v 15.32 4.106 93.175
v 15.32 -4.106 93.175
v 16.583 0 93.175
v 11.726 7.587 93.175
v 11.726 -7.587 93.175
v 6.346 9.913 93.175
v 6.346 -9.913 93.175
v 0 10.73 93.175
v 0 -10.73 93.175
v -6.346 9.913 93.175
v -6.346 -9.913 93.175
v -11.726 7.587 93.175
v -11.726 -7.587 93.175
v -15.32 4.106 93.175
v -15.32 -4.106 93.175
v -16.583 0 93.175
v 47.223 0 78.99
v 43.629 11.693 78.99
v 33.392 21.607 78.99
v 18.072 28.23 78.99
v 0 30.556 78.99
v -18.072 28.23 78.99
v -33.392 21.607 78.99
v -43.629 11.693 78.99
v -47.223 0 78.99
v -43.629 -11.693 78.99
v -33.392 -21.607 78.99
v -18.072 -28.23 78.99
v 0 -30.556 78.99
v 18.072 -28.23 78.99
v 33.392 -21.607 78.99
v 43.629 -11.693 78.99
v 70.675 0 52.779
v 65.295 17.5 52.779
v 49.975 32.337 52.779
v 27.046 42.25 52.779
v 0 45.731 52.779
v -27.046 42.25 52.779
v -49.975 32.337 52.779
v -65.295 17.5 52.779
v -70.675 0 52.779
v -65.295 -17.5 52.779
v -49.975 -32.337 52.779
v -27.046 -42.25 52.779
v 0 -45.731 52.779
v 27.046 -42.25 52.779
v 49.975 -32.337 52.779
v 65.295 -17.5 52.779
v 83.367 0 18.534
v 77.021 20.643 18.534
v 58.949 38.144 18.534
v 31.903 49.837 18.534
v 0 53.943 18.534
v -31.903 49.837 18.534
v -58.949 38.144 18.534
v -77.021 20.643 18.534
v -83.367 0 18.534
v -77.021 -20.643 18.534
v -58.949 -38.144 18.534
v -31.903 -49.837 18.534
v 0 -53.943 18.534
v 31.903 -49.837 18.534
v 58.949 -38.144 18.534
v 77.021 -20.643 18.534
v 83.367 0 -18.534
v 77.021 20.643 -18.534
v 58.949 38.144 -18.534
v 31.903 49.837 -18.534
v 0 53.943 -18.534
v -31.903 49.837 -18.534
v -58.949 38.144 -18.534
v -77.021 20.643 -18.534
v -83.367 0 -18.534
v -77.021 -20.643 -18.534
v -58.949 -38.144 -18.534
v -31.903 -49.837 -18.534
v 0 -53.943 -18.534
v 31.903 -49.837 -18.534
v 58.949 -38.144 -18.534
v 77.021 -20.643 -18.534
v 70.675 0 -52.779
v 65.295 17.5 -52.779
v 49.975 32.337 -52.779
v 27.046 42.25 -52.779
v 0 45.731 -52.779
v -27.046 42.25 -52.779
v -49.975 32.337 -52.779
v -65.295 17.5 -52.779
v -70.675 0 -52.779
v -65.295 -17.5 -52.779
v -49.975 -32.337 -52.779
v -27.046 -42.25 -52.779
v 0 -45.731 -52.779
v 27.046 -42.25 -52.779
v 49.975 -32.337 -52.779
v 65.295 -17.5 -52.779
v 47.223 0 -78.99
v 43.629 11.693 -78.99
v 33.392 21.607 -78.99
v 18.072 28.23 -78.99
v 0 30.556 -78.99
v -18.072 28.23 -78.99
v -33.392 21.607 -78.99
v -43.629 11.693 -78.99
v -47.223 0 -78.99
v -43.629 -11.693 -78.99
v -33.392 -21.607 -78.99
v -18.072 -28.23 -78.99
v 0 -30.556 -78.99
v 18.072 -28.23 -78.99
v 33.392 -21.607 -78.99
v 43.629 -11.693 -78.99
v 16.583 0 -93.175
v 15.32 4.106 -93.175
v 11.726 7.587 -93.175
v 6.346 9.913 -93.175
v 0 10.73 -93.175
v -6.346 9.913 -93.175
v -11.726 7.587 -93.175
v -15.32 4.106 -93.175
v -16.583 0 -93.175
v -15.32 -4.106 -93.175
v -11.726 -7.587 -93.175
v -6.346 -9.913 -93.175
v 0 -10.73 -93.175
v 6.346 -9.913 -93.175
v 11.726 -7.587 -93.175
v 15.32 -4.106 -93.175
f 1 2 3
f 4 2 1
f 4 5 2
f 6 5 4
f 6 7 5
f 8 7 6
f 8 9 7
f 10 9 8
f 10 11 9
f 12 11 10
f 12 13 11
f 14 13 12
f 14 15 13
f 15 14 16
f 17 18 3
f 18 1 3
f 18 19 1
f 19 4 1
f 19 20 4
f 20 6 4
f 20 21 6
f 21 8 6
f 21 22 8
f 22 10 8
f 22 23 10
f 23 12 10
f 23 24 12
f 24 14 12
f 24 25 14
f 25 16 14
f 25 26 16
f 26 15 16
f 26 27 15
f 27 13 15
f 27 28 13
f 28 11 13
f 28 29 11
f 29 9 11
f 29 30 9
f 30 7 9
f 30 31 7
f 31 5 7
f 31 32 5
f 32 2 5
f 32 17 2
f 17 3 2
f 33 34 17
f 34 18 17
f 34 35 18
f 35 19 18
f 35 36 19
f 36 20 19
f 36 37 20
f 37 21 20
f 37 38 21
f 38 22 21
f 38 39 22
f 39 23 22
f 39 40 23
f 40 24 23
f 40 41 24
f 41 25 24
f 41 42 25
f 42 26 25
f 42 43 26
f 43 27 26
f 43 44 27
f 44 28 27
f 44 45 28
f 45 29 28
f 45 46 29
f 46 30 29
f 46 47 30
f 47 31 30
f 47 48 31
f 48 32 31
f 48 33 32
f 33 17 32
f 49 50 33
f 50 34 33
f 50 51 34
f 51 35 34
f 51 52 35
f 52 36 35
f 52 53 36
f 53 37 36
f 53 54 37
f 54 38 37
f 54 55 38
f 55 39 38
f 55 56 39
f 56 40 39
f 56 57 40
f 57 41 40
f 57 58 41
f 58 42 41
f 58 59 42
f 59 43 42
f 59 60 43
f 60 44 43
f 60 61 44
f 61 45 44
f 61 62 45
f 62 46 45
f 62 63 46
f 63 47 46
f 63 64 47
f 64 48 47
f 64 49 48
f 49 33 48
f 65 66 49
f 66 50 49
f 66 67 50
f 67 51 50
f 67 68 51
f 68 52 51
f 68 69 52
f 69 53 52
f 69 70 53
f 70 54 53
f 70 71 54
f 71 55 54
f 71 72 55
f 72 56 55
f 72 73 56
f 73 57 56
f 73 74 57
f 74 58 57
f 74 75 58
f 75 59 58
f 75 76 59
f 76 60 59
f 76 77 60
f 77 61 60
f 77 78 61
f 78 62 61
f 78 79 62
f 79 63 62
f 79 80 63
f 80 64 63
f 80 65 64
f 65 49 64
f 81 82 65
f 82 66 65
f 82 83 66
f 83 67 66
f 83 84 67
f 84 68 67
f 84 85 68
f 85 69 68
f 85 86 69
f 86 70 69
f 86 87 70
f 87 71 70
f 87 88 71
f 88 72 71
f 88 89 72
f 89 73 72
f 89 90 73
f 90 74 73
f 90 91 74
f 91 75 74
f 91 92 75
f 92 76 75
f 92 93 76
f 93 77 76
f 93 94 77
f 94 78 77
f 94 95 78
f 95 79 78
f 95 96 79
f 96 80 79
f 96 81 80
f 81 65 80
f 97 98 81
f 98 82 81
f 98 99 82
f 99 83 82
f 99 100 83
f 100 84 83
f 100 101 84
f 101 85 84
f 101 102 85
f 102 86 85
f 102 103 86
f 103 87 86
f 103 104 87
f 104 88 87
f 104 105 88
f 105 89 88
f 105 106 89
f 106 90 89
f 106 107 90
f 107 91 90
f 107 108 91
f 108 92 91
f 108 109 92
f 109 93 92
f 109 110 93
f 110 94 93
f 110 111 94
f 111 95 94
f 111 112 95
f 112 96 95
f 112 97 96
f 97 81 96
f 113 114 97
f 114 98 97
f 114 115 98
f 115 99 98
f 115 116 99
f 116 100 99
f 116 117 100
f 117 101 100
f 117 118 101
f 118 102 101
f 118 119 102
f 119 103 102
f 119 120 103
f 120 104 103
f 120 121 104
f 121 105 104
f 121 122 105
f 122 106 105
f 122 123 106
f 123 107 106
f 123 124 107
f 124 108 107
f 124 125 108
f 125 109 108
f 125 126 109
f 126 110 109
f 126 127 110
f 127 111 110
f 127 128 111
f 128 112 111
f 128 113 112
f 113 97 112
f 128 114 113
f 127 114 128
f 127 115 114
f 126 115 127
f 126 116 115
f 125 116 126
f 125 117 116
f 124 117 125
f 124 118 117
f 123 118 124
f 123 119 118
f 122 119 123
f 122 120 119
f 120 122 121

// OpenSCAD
// Generated by SolidPython 1.0.1 on 2020-07-29 00:46:53


scale(v = [17, 11, 19]) {
	sphere(r = 5);
}
/***********************************************
*********      SolidPython code:      **********
************************************************
 
# import packages: SolidPython
from solid import *
from solid.utils import *
from itertools import chain, combinations, permutations


class Resize:

    def __init__(self, scad_file):
        self.scad_file = scad_file
        #self.scad_file = import_scad(scad_file)
        # cone/cylinder param:
        self.r1 = 0
        self.r2 = 0
        self.h = 0
        # rectangular prism param:
        self.w = 0
        self.l = 0
        # ellipse param:
        self.r = 0

    # import OpenScad code (file name corresponds to shape)


    # classify shape + parameters
    def assign(self, param1, param2, param3):
        if self.scad_file == 'cone.scad':
            self.r1 = param1
            self.r2 = param2
            self.h = param3
        elif self.scad_file == 'cylinder.scad':
            self.r1 = param1
            self.r2 = param2
            self.h = param3
        elif self.scad_file == 'rectangularPrism.scad':
            self.h = param1
            self.l = param2
            self.w = param3
        else:
            self.r = param1
            self.h = param2

    # resize parameters
    def iterate(self):
        x = range(3, 20, 2)
        i = 1
        if self.scad_file == 'cone.scad':
            tempList = list(permutations(x, 2))
            for temp in tempList:
                param1 = temp[0]
                param2 = temp[1]
                filepath = 'produced_scad_files/' + 'cone' + str(param1) + '_' + str(param2) + '_' + '.scad'
                scad_render_to_file(cylinder(h=param1, r1=param2, r2=0), filepath)

        elif self.scad_file == 'cylinder.scad':
            tempList = list(permutations(x, 3))
            for temp in tempList:
                param1 = temp[0]
                param2 = temp[1]
                filepath = 'produced_scad_files/' + 'cylinder' + str(param1) + '_' + str(param2) + '_' + '.scad'
                scad_render_to_file(cylinder(h=param1, r1=param2, r2=param2), filepath)

        elif self.scad_file == 'rectangularPrism.scad':
            tempList = list(permutations(x, 3))
            for temp in tempList:
                param1 = temp[0]
                param2 = temp[1]
                param3 = temp[2]
                filepath = 'produced_scad_files/' + 'rectangularPrism' + str(param1) + '_' + str(param2) + '_' + str(
                    param3) + '.scad'
                scad_render_to_file(cube(size=(param1, param2, param3)), filepath)

        elif self.scad_file == 'ellipse.scad':
            tempList = list(permutations(x, 4))
            for temp in tempList:
                param1 = temp[0]
                param2 = temp[1]
                param3 = temp[2]
                param4 = temp[3]
                filepath = 'produced_scad_files/' + 'ellipse' + str(param1) + '_' + str(param2) + '_' + str(param3) + '_' + str(param4) + '.scad'
                scad_render_to_file(scale([param1, param2, param3])(sphere(r=param4)), filepath)

    def render_to_scadfile(self):
        scad_render_to_file(scad, 'example.scad') 
 
************************************************/
